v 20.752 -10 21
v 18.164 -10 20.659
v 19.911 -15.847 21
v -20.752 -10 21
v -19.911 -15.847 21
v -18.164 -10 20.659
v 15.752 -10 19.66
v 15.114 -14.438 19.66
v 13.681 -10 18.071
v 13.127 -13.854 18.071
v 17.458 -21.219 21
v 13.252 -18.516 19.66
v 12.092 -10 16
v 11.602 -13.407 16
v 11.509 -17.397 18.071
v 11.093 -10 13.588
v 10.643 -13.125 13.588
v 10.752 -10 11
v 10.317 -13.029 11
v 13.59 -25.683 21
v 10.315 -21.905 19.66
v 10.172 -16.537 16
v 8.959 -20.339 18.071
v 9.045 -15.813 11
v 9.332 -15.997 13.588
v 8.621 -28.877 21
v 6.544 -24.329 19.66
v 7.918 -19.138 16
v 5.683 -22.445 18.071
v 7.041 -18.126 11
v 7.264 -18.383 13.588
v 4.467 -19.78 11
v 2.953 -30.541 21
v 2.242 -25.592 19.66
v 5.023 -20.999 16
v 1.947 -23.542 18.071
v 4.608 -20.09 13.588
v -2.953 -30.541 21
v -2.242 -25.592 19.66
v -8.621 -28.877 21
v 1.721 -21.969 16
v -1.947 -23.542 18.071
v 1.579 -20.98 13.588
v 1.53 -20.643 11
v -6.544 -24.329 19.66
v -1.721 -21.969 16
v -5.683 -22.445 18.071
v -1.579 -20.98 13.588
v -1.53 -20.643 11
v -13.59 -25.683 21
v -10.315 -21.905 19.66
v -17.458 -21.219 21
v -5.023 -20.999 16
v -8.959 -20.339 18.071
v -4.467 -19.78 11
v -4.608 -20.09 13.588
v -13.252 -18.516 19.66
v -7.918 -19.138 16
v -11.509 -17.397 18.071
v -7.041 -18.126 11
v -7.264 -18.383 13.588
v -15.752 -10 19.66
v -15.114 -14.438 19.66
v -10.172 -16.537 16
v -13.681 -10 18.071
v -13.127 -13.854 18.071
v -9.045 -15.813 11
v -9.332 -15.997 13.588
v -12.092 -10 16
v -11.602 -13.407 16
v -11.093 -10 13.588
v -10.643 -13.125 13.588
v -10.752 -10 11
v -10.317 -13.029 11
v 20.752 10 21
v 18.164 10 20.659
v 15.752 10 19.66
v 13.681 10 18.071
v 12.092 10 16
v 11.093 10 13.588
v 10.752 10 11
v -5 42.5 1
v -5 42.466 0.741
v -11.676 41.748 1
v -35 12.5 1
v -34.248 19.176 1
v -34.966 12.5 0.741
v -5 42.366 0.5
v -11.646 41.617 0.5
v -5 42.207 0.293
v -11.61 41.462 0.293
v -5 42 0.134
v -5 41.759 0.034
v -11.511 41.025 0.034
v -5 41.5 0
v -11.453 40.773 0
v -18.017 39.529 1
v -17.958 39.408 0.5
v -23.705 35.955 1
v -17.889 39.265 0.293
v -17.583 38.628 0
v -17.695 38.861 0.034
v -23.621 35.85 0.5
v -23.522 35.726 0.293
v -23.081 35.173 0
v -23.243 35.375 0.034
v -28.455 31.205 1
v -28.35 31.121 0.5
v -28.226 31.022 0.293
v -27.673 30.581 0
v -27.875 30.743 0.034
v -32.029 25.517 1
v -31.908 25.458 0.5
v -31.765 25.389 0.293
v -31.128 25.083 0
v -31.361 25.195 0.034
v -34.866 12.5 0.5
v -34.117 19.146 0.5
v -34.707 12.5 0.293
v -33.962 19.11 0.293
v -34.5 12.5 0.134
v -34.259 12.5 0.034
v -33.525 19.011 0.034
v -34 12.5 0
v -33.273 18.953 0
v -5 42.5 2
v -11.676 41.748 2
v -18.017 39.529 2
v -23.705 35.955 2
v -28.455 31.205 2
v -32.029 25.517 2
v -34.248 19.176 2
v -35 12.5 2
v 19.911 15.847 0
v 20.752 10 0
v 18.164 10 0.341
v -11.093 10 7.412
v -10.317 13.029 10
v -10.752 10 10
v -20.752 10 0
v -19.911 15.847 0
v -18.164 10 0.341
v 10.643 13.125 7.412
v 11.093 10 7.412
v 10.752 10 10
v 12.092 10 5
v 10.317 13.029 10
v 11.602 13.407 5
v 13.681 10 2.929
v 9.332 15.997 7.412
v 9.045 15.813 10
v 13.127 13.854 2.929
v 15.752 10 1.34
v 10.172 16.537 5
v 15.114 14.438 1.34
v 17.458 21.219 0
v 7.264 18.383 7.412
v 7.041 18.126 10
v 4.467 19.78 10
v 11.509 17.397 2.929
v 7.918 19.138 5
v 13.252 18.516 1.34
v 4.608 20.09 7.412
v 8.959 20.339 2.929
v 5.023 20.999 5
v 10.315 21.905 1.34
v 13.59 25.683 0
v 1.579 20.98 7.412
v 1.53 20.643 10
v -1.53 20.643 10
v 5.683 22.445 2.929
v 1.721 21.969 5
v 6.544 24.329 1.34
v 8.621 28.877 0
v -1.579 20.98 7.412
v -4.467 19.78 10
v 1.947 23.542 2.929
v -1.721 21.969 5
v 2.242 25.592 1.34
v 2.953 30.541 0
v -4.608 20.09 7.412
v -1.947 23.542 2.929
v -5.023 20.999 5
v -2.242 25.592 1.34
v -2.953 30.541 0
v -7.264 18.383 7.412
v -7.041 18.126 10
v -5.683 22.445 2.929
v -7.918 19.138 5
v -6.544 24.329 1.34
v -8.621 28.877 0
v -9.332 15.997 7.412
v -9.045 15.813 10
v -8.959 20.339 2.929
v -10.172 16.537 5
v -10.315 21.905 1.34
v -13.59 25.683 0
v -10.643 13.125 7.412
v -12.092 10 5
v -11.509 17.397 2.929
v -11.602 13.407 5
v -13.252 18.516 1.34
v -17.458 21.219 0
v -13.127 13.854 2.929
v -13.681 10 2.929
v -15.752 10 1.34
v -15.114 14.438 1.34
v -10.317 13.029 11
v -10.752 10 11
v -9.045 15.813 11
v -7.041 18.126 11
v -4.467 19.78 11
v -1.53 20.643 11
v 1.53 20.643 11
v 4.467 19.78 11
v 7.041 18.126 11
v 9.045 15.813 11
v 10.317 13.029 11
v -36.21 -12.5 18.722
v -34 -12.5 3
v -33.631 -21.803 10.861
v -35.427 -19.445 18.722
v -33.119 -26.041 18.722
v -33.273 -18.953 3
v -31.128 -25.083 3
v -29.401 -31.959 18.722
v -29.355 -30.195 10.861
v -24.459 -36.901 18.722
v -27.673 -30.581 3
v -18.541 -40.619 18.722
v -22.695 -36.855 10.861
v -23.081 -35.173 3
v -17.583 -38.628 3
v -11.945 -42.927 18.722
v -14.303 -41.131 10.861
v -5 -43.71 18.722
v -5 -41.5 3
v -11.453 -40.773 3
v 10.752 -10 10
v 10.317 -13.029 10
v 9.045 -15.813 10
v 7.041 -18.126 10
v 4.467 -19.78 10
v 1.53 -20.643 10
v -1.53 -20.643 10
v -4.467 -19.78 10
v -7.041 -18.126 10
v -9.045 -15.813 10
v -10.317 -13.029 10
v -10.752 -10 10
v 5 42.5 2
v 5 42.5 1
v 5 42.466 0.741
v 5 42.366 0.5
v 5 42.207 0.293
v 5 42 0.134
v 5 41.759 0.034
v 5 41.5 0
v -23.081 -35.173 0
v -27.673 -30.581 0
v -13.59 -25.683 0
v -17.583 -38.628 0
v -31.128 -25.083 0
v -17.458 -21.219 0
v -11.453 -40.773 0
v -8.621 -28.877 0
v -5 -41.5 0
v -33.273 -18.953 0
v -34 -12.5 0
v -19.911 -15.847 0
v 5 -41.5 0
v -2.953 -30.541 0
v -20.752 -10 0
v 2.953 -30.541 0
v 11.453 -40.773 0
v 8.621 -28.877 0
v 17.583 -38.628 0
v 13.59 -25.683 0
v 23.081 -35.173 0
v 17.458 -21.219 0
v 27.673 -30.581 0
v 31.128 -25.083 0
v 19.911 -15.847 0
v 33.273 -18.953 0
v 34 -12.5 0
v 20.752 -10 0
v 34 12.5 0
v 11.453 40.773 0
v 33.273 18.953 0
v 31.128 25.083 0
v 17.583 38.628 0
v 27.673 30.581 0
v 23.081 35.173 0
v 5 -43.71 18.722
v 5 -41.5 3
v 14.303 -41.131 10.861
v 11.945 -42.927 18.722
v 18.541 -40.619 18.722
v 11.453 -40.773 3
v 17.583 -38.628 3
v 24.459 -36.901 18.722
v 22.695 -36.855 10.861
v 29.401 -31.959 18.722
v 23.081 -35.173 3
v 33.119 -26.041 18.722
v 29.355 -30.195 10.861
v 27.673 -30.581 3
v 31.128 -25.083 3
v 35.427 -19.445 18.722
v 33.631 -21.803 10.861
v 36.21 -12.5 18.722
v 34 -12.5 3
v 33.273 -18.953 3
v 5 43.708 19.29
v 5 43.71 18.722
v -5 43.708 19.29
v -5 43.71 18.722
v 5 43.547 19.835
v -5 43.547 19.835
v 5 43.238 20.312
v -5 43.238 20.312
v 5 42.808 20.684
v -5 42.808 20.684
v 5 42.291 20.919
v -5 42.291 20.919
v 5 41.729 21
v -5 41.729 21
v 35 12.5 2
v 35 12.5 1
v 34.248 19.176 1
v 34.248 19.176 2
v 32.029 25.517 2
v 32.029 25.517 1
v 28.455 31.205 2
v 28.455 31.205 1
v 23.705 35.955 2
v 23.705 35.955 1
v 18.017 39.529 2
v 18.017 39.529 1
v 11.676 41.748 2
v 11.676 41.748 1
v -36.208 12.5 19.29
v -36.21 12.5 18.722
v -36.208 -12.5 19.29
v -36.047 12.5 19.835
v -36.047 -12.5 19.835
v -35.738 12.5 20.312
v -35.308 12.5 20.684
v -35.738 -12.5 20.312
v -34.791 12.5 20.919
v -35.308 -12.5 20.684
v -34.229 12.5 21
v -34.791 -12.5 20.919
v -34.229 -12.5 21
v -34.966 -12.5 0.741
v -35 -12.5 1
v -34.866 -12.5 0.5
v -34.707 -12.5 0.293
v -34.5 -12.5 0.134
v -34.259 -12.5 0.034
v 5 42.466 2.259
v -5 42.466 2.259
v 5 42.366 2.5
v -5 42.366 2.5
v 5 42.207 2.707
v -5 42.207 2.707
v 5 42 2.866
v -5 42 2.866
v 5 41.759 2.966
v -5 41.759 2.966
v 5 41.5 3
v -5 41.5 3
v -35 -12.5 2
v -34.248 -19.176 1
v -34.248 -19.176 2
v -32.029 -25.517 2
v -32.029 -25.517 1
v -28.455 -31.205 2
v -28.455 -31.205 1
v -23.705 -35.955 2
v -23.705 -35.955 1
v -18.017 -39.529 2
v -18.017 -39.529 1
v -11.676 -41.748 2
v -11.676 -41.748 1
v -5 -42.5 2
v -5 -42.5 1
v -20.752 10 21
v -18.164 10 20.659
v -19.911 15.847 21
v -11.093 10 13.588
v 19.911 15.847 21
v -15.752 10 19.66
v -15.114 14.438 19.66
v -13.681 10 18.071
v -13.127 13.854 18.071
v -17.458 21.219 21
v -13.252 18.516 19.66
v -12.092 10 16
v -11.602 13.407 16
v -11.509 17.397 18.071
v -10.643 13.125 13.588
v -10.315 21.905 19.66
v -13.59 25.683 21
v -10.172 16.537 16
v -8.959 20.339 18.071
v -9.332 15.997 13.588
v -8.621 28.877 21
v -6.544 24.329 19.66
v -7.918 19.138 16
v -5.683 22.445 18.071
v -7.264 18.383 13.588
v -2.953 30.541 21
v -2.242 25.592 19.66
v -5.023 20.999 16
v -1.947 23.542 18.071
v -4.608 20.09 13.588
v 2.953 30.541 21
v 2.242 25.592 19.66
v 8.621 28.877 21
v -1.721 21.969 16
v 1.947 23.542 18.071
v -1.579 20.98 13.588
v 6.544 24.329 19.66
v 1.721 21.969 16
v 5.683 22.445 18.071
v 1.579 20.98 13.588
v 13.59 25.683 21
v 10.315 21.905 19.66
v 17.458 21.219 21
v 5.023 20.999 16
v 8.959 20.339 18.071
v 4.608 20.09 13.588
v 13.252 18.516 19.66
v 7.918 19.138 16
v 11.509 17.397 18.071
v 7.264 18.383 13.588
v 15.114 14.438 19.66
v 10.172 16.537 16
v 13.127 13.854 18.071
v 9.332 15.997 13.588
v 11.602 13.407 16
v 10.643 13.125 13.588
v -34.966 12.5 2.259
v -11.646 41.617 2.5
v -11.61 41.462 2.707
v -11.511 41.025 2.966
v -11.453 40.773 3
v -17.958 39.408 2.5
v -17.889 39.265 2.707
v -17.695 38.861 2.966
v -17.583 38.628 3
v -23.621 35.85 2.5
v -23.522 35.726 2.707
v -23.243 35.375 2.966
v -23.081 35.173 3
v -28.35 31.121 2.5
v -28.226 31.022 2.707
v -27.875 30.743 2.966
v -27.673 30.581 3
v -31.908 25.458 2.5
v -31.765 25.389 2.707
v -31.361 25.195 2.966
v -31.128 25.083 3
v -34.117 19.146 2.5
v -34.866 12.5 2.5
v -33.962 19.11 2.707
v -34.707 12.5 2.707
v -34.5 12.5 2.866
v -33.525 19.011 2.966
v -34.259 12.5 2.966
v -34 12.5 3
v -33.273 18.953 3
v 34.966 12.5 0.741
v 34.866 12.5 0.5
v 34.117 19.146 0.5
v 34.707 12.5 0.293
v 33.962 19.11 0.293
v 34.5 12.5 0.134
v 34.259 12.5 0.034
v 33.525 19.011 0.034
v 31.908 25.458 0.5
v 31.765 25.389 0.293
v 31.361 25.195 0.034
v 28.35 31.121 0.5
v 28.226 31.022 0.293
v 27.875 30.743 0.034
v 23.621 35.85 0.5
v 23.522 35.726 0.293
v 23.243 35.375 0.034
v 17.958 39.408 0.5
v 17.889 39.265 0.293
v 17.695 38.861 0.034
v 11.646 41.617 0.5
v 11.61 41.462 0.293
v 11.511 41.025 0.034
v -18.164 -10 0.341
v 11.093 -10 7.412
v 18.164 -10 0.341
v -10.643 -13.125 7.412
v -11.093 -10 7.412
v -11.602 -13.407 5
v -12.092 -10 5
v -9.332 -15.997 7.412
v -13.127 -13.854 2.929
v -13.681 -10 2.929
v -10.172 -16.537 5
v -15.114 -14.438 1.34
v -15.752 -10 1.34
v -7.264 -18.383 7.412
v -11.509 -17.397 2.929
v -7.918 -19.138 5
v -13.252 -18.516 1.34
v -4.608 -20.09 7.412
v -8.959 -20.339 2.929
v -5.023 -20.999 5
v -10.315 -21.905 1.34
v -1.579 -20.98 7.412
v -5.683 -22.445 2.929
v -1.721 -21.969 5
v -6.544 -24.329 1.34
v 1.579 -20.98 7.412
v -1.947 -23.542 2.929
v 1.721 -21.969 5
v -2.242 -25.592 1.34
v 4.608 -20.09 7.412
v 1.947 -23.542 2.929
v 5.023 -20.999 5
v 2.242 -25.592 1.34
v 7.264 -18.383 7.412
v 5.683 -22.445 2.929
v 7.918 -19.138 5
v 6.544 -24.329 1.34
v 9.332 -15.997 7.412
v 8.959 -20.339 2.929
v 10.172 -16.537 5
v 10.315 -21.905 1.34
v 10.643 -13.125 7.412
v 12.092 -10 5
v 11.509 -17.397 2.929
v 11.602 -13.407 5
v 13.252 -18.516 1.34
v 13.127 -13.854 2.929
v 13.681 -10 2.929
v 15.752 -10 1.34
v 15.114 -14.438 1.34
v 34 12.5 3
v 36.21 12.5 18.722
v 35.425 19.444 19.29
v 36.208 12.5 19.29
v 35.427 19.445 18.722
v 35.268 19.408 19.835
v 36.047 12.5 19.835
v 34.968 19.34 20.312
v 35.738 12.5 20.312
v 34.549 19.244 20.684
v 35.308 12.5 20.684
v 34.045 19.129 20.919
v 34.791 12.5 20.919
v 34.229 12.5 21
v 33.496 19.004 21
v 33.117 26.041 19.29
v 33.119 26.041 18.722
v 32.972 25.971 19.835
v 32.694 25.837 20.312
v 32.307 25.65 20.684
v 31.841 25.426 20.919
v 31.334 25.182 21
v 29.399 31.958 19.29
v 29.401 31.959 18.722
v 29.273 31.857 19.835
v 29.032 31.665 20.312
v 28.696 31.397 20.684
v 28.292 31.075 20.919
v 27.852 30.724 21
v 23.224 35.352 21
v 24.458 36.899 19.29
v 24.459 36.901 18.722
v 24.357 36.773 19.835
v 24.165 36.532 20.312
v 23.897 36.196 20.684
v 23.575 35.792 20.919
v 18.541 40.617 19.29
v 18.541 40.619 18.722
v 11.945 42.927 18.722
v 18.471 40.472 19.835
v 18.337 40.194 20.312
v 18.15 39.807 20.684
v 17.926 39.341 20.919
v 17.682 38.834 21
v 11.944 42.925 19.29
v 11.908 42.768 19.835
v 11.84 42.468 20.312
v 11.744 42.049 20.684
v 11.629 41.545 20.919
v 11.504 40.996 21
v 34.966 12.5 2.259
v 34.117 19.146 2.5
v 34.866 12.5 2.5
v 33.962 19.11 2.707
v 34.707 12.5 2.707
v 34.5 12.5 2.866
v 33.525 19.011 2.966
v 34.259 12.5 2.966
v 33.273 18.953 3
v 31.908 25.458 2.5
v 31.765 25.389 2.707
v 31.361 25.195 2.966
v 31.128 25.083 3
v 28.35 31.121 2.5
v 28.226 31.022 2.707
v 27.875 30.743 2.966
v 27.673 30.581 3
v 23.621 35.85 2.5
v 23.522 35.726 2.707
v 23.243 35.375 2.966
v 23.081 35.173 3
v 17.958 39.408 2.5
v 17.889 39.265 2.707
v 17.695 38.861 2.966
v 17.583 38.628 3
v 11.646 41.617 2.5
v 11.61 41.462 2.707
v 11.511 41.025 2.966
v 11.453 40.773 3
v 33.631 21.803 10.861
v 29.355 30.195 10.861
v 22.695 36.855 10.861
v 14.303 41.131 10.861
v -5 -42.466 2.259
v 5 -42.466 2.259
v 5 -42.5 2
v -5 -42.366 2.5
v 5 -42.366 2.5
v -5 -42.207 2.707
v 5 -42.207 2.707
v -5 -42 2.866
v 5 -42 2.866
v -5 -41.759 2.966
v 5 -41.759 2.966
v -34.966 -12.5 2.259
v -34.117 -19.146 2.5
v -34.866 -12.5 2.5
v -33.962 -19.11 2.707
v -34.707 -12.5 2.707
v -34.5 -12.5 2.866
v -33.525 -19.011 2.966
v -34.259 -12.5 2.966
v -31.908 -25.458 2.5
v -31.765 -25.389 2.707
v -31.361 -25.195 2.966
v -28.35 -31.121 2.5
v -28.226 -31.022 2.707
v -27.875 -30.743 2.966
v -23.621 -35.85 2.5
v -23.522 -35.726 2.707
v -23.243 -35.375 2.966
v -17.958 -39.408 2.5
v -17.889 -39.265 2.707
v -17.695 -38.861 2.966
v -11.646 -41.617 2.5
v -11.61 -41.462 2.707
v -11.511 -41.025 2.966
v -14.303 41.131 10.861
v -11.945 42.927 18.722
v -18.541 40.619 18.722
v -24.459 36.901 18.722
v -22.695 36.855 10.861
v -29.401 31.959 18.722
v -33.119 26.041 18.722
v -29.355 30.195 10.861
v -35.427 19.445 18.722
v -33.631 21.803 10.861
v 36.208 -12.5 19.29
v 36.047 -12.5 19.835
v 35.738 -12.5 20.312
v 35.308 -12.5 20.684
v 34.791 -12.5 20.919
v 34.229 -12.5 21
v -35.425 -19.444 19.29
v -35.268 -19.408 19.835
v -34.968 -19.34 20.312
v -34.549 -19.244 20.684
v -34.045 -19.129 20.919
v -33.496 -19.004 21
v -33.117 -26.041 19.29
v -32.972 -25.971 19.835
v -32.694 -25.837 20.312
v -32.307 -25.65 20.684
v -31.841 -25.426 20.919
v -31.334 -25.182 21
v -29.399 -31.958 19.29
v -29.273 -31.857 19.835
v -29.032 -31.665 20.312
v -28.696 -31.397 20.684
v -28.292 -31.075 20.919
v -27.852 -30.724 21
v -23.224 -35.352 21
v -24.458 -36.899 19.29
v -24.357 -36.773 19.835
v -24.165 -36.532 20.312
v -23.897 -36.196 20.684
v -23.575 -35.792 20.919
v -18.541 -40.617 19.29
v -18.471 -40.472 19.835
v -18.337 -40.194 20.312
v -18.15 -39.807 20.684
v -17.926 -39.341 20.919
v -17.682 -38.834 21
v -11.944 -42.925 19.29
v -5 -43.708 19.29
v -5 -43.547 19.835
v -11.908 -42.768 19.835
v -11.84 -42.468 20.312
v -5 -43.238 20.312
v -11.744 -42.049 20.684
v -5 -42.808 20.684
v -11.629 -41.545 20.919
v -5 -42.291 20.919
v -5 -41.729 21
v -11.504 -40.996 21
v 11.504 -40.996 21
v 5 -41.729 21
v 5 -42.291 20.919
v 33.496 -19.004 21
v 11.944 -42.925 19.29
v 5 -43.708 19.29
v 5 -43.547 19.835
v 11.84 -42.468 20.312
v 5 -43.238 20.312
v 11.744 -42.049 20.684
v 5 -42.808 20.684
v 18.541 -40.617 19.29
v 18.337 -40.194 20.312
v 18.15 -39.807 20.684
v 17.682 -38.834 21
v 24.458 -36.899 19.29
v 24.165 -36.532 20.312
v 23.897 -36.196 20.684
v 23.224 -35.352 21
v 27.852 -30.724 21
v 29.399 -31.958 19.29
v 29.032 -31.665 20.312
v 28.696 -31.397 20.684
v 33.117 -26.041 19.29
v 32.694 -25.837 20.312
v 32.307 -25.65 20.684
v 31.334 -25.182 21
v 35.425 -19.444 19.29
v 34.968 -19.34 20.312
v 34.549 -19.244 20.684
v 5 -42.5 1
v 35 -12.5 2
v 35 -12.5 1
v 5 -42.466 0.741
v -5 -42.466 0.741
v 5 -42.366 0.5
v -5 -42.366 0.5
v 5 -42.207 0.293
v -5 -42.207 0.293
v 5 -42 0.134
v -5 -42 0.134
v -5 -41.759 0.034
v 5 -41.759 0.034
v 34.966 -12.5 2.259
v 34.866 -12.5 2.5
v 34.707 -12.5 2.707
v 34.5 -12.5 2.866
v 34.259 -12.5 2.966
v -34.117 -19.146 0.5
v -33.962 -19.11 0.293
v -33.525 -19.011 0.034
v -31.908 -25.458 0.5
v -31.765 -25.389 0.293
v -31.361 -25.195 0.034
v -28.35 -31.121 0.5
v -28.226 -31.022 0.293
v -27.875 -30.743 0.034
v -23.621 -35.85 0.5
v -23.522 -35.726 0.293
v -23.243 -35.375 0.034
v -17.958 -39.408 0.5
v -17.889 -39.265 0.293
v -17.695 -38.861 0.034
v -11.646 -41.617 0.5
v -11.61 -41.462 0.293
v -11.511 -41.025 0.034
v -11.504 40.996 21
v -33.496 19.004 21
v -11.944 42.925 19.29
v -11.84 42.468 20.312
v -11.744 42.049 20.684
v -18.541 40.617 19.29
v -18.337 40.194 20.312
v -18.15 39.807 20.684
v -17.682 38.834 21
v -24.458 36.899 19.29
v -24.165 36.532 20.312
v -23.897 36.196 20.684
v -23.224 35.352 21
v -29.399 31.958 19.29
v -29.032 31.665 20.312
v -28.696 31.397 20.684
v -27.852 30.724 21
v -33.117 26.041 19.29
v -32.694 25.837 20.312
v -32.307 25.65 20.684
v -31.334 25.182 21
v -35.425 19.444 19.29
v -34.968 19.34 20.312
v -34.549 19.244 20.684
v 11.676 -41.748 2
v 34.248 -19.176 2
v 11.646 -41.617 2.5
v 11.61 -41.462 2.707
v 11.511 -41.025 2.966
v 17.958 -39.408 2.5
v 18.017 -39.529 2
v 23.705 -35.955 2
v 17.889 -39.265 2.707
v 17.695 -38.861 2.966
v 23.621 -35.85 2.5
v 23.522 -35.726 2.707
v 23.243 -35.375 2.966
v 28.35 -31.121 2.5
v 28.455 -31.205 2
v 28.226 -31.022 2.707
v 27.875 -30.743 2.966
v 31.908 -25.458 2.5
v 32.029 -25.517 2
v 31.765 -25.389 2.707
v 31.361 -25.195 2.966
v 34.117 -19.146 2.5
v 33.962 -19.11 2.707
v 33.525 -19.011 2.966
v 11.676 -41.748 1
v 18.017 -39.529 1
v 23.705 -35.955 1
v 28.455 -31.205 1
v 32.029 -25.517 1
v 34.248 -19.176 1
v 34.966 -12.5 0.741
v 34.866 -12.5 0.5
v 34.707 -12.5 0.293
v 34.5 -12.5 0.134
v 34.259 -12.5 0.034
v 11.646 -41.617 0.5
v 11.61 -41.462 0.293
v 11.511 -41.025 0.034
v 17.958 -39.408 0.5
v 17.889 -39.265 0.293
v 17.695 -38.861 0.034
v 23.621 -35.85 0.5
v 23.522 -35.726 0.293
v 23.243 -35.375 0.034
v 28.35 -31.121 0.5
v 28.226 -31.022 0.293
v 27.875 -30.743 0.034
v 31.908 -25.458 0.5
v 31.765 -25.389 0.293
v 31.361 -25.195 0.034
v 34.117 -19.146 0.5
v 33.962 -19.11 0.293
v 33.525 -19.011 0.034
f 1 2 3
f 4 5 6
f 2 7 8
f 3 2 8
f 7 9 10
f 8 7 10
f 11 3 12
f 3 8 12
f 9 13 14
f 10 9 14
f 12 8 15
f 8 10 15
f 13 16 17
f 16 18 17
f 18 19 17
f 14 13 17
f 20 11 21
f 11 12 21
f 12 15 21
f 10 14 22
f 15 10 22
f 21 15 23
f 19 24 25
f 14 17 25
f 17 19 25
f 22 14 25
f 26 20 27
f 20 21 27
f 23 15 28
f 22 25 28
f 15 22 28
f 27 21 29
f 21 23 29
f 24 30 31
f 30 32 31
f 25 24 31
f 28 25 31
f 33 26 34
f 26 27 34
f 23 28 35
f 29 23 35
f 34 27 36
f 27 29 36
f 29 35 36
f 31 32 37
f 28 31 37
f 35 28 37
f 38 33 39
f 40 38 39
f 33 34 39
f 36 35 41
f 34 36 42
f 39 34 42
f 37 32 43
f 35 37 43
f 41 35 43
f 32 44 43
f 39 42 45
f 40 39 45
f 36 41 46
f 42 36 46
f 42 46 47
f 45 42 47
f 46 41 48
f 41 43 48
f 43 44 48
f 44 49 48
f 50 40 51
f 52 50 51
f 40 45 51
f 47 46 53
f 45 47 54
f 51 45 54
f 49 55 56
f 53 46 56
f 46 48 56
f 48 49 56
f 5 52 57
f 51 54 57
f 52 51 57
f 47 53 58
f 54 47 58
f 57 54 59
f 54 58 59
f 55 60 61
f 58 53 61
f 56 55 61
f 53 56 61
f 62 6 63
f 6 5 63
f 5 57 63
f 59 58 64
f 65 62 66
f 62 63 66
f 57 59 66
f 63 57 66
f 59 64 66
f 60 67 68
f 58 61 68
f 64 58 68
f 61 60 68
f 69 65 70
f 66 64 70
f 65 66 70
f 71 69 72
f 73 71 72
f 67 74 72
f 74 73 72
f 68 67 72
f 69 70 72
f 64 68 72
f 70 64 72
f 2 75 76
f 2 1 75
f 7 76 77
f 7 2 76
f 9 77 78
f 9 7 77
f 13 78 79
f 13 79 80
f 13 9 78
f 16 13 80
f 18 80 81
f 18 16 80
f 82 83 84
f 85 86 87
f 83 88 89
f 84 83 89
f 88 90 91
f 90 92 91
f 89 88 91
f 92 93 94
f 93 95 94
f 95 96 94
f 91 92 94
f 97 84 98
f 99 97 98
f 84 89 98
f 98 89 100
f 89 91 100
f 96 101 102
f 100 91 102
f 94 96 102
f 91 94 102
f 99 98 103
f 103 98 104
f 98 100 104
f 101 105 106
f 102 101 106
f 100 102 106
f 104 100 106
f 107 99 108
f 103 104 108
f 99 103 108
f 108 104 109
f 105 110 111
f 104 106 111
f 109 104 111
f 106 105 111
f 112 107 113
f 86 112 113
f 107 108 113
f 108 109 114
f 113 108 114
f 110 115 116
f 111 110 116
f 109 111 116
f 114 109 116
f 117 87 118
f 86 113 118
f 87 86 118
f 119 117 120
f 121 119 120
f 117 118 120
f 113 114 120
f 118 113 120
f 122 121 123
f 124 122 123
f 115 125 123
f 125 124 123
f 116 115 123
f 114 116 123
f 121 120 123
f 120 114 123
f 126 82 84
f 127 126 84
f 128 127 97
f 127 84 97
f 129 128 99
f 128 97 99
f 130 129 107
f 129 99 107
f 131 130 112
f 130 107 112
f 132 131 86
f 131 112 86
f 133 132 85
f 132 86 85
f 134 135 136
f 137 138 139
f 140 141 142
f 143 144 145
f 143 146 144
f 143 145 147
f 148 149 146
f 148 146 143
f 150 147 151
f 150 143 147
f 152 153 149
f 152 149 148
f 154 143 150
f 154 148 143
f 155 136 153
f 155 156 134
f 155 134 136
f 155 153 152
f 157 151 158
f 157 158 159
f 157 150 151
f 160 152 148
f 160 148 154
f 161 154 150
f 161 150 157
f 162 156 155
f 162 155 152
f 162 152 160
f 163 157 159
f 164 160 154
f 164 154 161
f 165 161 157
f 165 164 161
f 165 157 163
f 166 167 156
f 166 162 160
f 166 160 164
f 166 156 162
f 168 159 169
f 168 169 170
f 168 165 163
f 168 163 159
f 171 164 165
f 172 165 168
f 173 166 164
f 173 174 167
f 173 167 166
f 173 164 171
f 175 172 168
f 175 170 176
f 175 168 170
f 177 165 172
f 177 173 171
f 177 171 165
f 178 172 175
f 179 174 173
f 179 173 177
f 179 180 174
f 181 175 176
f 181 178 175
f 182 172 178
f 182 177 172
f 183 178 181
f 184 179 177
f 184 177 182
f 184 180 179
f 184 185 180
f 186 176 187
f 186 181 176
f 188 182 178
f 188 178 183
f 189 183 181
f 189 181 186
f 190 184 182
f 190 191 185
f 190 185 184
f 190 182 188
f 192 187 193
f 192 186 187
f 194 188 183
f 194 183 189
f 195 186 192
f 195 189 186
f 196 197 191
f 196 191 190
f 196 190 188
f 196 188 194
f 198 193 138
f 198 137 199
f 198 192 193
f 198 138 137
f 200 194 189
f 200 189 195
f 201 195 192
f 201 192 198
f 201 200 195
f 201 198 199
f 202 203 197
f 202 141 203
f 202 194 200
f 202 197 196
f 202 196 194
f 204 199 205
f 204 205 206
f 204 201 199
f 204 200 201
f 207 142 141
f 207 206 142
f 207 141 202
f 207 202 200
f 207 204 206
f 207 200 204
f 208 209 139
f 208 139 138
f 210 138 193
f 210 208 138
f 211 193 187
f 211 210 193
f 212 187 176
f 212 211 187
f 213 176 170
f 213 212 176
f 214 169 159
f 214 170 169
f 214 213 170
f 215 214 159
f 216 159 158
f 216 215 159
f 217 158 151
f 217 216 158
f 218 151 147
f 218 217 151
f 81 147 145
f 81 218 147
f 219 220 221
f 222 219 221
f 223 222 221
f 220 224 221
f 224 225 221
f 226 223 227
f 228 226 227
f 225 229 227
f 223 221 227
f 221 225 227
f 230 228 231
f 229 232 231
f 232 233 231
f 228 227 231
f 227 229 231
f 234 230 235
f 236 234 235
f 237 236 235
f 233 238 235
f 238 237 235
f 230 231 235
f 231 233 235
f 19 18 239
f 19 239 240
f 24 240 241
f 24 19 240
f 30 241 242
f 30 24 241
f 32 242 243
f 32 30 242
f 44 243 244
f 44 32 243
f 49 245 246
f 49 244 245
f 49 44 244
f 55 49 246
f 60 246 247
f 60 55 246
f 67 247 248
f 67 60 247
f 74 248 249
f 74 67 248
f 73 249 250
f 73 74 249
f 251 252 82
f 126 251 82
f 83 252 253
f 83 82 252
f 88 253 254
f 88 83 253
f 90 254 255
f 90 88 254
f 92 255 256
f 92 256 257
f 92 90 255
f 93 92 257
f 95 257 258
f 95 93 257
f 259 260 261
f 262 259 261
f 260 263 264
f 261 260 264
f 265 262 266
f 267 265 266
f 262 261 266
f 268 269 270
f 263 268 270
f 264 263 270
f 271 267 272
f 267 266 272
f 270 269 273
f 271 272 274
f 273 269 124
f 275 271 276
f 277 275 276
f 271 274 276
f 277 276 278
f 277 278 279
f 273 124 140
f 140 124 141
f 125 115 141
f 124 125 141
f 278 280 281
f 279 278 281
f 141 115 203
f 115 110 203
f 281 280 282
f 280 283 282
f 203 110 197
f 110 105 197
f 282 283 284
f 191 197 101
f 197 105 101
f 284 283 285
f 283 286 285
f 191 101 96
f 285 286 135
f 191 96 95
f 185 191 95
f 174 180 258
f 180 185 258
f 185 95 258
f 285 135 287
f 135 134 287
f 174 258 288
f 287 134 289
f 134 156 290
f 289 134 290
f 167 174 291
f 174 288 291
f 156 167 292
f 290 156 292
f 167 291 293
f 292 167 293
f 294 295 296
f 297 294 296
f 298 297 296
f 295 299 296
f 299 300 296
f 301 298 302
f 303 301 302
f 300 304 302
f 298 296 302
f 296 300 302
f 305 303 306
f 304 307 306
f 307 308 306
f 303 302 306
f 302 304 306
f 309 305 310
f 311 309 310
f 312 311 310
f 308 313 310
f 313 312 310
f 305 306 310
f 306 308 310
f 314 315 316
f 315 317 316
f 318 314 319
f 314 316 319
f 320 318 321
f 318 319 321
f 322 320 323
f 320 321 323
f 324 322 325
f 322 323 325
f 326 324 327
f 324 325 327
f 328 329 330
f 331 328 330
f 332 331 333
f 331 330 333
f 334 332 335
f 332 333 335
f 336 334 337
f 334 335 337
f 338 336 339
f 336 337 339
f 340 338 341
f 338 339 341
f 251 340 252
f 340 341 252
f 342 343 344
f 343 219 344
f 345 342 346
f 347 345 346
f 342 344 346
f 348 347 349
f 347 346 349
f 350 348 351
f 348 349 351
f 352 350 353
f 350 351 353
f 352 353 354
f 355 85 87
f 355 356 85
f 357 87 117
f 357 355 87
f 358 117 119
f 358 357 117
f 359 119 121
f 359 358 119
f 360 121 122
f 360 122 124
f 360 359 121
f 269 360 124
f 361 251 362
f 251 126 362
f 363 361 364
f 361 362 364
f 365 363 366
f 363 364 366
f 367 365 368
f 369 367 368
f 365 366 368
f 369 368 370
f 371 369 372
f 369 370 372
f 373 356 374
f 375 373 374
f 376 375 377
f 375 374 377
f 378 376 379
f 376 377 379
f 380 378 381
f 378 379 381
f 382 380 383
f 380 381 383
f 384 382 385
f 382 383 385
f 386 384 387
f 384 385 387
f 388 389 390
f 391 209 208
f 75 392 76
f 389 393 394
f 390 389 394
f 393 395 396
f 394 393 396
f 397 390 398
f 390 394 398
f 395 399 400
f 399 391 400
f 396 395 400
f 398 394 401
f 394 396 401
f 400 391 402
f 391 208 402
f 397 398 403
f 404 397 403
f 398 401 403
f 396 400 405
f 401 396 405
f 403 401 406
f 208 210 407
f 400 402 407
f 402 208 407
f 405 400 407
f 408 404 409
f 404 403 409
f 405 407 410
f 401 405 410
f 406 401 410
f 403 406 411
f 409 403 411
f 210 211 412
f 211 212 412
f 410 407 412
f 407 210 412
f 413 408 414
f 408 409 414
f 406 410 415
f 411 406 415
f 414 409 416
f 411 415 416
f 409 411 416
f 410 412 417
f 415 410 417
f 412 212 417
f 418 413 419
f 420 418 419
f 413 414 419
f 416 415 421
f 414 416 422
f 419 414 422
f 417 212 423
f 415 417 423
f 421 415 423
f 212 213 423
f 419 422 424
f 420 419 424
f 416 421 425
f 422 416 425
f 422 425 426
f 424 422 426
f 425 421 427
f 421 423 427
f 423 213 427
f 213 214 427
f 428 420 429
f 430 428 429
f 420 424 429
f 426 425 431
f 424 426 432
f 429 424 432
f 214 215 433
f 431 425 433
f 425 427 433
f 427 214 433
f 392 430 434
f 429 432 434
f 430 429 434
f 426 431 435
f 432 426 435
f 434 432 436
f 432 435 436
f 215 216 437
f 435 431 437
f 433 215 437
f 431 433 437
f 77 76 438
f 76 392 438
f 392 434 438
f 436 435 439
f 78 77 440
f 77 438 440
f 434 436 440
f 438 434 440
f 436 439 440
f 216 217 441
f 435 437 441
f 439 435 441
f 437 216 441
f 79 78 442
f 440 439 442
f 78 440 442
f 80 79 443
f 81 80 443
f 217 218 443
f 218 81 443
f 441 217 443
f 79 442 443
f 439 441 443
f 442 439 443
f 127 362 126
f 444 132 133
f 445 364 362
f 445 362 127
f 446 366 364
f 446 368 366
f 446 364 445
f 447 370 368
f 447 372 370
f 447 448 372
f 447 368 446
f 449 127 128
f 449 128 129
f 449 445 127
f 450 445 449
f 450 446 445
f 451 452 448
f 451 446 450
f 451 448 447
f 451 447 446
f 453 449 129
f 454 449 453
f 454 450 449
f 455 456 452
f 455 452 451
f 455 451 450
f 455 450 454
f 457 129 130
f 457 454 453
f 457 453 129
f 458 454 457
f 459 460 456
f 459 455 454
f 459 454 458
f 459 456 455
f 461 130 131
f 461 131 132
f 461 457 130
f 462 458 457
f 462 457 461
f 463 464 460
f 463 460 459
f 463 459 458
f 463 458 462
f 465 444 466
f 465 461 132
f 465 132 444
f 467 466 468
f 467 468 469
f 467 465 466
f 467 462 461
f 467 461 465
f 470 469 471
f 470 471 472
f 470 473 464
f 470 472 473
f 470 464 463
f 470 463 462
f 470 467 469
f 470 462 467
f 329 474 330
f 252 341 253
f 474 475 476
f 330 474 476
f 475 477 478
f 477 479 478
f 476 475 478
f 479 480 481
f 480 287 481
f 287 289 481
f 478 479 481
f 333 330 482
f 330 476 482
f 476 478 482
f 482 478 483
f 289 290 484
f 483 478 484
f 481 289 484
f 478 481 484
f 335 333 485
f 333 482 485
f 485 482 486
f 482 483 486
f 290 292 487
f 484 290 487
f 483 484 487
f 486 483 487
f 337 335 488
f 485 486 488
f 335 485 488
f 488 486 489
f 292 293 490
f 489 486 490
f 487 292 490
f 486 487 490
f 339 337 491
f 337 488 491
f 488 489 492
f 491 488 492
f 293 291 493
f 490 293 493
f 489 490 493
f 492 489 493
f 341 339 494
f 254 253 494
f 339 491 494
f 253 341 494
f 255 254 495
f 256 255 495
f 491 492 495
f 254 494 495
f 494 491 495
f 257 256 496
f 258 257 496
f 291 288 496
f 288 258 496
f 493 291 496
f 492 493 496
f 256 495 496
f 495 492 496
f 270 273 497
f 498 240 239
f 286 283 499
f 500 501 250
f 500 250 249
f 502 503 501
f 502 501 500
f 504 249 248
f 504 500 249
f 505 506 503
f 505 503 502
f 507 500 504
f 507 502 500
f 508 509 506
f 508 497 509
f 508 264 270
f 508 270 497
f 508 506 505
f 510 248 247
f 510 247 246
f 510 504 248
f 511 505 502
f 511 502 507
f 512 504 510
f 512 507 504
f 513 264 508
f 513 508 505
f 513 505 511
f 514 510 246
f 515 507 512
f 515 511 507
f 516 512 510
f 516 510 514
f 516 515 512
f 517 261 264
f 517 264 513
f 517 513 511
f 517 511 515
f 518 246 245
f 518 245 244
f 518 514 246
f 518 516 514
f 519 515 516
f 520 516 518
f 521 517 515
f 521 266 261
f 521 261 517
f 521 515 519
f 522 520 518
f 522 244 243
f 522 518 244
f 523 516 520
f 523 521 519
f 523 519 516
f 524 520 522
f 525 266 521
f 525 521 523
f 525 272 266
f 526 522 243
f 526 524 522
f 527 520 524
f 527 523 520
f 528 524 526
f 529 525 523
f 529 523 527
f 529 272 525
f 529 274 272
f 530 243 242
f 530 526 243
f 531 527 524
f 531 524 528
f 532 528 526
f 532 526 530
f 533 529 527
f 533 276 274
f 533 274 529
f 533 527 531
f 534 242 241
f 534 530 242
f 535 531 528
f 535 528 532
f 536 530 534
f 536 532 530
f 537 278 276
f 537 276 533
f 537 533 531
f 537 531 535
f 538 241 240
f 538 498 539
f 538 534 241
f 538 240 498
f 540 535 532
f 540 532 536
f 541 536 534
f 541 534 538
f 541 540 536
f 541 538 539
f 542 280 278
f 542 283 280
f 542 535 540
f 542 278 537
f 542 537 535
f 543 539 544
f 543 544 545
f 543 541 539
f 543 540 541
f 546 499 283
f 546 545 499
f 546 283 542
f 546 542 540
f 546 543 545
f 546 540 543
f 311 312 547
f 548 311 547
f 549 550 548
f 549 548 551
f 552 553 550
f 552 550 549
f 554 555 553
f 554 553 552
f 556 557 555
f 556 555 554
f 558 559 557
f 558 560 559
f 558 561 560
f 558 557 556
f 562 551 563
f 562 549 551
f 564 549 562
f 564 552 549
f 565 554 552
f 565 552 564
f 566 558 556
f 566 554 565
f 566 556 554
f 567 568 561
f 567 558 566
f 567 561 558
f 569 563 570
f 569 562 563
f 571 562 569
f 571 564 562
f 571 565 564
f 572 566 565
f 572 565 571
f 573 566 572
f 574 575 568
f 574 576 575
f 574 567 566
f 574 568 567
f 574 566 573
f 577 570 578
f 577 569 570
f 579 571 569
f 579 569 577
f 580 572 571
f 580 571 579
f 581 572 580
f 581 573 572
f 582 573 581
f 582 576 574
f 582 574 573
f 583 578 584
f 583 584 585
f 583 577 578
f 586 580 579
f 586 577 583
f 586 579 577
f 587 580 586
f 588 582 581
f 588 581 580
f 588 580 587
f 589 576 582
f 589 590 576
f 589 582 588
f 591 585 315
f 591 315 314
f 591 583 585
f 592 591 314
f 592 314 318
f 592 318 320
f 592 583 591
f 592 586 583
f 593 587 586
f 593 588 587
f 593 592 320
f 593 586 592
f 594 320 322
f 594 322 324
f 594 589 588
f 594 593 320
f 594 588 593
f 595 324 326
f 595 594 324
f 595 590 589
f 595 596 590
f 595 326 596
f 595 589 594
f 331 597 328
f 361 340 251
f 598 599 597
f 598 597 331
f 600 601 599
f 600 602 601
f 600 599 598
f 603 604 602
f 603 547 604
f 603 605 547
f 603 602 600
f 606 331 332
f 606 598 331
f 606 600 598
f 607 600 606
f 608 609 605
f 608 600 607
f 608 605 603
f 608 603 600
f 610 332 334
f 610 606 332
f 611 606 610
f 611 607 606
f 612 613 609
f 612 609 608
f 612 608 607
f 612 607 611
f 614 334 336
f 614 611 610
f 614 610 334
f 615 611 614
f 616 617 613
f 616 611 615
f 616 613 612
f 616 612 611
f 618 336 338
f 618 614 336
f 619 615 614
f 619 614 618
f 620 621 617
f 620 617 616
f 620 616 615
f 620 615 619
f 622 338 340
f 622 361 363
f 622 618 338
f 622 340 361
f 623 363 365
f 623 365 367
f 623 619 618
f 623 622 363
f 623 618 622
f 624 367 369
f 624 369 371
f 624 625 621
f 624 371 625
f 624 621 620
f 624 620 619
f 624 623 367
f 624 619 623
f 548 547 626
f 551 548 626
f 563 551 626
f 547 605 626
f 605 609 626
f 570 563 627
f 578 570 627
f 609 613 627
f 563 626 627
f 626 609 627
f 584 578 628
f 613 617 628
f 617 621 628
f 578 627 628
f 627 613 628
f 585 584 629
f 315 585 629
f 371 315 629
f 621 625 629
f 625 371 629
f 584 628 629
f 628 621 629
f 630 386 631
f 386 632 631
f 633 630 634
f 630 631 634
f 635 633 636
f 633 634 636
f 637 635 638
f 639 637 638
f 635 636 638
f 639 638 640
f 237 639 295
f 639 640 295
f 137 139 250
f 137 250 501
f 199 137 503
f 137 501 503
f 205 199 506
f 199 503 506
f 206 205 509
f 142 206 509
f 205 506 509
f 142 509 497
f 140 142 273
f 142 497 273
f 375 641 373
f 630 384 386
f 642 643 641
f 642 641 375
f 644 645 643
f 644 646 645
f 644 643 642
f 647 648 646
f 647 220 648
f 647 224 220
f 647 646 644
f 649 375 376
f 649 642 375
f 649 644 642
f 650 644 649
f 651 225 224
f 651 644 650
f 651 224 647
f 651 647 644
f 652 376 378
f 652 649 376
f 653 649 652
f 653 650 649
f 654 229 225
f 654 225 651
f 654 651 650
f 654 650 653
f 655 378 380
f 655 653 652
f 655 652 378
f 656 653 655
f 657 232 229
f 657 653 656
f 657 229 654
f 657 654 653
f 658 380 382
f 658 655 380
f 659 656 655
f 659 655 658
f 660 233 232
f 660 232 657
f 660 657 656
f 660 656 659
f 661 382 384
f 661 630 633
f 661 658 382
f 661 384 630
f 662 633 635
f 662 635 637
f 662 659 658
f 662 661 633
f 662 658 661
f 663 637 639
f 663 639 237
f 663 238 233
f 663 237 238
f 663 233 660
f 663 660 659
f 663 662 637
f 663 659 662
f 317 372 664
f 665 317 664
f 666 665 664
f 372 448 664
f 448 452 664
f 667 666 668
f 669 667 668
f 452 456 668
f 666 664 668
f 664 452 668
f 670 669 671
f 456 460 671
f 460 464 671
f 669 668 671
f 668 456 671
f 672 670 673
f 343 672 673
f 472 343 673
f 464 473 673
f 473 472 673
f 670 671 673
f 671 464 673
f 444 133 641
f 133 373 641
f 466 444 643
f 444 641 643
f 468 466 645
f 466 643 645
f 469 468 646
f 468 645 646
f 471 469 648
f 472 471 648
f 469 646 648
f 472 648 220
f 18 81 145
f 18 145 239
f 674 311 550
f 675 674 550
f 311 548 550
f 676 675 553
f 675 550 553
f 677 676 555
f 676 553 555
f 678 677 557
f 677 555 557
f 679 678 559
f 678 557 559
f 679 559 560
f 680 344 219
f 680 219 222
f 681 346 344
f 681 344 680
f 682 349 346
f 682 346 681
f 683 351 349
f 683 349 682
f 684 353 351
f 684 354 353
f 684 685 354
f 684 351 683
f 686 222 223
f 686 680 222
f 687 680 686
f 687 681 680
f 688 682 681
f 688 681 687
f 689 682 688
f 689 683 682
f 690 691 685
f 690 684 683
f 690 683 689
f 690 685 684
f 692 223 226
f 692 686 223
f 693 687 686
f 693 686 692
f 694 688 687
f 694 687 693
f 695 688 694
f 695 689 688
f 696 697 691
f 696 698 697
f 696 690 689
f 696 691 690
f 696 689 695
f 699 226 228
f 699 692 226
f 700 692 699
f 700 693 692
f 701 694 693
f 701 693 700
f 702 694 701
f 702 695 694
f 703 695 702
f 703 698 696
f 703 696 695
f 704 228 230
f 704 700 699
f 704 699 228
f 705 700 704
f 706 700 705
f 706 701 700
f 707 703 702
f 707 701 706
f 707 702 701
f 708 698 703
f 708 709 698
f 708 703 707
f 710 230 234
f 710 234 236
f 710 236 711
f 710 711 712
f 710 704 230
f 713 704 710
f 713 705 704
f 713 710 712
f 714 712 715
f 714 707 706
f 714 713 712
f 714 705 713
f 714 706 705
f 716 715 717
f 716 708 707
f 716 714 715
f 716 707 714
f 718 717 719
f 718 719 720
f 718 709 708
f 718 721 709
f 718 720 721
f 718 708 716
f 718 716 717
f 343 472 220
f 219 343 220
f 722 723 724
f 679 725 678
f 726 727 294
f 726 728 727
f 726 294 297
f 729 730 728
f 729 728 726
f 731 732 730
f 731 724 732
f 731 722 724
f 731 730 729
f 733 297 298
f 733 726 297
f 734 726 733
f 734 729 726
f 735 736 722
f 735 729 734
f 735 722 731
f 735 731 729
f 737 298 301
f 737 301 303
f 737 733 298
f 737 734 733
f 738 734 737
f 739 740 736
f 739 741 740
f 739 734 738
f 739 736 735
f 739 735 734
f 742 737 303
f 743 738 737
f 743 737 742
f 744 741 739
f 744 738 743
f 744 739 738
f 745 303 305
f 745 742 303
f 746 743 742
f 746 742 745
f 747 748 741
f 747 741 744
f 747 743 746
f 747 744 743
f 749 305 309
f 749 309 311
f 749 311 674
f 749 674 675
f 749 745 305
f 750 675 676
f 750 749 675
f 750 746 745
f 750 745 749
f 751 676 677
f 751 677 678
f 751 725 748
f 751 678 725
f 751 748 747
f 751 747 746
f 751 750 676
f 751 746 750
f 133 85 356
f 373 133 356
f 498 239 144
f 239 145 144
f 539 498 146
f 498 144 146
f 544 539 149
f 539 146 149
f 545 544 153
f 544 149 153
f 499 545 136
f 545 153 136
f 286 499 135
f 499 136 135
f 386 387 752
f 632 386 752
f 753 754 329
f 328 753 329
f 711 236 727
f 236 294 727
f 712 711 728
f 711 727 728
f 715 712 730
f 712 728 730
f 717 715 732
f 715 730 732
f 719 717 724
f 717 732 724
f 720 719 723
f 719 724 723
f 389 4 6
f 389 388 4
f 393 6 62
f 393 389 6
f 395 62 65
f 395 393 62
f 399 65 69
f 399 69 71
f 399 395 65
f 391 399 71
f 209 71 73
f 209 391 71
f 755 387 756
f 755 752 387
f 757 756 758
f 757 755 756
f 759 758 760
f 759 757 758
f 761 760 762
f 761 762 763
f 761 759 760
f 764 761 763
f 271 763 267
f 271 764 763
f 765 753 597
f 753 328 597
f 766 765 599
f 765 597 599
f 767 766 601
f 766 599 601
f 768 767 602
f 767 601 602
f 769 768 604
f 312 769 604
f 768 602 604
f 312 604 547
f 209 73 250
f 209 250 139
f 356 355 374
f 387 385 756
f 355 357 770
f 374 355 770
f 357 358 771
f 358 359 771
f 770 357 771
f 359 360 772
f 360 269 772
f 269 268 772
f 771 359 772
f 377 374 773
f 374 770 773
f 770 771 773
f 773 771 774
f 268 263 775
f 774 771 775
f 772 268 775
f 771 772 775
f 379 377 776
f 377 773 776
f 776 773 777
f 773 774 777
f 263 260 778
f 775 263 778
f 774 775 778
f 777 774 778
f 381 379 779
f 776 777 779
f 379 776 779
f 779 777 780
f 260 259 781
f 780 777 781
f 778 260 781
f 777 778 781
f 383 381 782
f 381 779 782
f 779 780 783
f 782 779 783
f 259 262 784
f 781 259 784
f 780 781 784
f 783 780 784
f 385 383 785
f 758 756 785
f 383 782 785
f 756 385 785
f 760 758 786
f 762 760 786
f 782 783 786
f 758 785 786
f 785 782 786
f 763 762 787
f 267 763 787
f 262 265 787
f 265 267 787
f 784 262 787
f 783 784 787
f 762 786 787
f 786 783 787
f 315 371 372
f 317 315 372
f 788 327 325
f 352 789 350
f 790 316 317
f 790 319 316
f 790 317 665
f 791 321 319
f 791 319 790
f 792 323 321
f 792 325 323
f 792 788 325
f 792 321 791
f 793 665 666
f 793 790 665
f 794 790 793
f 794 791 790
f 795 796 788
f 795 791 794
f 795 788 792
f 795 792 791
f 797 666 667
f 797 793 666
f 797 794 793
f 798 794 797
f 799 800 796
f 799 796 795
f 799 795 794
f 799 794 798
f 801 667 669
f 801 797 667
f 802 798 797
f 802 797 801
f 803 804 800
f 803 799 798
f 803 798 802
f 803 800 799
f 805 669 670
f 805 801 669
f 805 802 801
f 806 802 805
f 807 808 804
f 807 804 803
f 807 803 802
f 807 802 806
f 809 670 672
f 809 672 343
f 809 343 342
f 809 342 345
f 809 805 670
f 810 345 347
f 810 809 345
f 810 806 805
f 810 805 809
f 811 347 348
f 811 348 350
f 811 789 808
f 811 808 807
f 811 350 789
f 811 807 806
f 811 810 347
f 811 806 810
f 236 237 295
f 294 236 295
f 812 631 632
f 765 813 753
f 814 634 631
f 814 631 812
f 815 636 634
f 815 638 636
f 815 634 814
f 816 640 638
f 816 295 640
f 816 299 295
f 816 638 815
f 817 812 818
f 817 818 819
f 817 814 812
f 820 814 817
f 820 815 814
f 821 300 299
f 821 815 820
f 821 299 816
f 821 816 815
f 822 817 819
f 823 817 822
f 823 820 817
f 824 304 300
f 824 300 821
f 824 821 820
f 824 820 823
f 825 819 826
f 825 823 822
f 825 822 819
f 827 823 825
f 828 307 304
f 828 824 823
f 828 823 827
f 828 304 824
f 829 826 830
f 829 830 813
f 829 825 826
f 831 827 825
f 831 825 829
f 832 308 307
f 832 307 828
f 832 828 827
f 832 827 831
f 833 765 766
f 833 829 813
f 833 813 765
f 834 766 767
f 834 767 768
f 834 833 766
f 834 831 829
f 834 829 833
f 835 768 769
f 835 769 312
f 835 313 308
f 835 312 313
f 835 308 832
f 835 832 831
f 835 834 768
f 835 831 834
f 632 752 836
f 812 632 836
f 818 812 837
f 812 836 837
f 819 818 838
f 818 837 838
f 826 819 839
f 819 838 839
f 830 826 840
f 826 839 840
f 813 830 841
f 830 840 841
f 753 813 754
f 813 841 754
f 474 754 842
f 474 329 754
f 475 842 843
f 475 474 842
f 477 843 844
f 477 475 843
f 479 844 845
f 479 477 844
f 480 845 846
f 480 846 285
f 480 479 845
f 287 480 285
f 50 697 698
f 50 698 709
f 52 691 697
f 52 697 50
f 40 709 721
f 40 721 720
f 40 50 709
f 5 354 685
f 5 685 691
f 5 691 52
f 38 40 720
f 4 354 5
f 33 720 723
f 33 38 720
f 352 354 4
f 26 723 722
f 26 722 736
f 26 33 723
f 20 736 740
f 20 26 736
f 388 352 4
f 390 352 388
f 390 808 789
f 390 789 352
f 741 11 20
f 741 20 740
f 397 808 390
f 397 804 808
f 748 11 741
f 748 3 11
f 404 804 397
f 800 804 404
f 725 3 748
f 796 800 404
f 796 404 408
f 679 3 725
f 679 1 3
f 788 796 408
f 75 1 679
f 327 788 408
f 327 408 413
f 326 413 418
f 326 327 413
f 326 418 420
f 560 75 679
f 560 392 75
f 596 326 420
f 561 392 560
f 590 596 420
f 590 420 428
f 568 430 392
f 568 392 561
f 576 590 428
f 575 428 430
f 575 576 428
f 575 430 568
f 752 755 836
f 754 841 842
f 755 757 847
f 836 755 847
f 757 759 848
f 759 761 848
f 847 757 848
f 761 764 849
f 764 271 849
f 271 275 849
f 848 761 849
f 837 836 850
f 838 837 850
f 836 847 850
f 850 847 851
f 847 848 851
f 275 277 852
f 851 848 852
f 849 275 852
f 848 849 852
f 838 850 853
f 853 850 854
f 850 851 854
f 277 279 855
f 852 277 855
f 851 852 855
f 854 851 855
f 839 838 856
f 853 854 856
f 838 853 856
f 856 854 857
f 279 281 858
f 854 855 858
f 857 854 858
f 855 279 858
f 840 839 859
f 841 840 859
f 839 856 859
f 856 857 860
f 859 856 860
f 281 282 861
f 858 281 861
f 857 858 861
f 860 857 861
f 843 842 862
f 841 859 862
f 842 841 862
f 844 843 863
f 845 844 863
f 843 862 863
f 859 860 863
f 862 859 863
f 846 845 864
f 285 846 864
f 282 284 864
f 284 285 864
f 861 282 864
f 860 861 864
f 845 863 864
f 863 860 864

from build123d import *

# Parameters (mm, degrees)
BOSS_EXTRUDE1_DEPTH = 3
FILLET1_R           = 1
BOSS_EXTRUDE2_DEPTH = 18
BOSS_EXTRUDE2_DRAFT = -8
FILLET2_R           = 2
CUT_EXTRUDE1_DEPTH  = 61.545566409
FILLET4_R           = 10


with BuildPart() as part:
    # Sketch2 → Boss-Extrude1 (new body)
    with BuildSketch(Plane.XY):
        with BuildLine():
            Line((-5, -42.5), (5, -42.5))
            ThreePointArc((5, -42.5), (26.213203436, -33.713203436), (35, -12.5))
            Line((35, -12.5), (35, 12.5))
            ThreePointArc((35, 12.5), (26.213203436, 33.713203436), (5, 42.5))
            Line((5, 42.5), (-5, 42.5))
            ThreePointArc((-5, 42.5), (-26.213203436, 33.713203436), (-35, 12.5))
            Line((-35, 12.5), (-35, -12.5))
            ThreePointArc((-35, -12.5), (-26.213203436, -33.713203436), (-5, -42.5))
        make_face()
    extrude(amount=BOSS_EXTRUDE1_DEPTH)

    # Fillet1
    fillet1_edges = [part.edges().sort_by_distance(p)[0] for p in [
        (0, -42.5, 0),
        (-26.213203436, -33.713203436, 0),
        (-35, 0, 0),
        (-26.213203436, 33.713203436, 0),
        (-26.213203436, -33.713203436, 3),
        (0, -42.5, 3),
        (26.213203436, -33.713203436, 3),
        (35, 0, 3),
        (26.213203436, 33.713203436, 3),
        (0, 42.5, 3),
        (-26.213203436, 33.713203436, 3),
        (0, 42.5, 0),
        (-35, 0, 3),
        (26.213203436, 33.713203436, 0),
        (35, 0, 0),
        (26.213203436, -33.713203436, 0),
    ]]
    fillet(fillet1_edges, radius=FILLET1_R)


with BuildPart() as boss_extrude2_tool:
    # Sketch3 → Boss-Extrude2 (with draft: the straight prism first)
    with BuildSketch(Plane.XY.offset(3)):
        with BuildLine():
            Line((5, 41.5), (-5, 41.5))
            ThreePointArc((-5, 41.5), (-25.506096654, 33.006096654), (-34, 12.5))
            Line((-34, 12.5), (-34, -12.5))
            ThreePointArc((-34, -12.5), (-25.506096654, -33.006096654), (-5, -41.5))
            Line((-5, -41.5), (5, -41.5))
            ThreePointArc((5, -41.5), (25.506096654, -33.006096654), (34, -12.5))
            Line((34, -12.5), (34, 12.5))
            ThreePointArc((34, 12.5), (25.506096654, 33.006096654), (5, 41.5))
        make_face()
    extrude(amount=BOSS_EXTRUDE2_DEPTH)
    # Boss-Extrude2: the draft: its side faces are tilted about the plane it starts from
    boss_extrude2_sides = [boss_extrude2_tool.faces().sort_by_distance(p)[0] for p in [
        (-25.506096654, -33.006096654, 12),
        (0, -41.5, 12),
        (25.506096654, -33.006096654, 12),
        (34, 0, 12),
        (25.506096654, 33.006096654, 12),
        (0, 41.5, 12),
        (-25.506096654, 33.006096654, 12),
        (-34, 0, 12),
    ]]
    draft(boss_extrude2_sides, Plane.XY.offset(3), BOSS_EXTRUDE2_DRAFT)


with BuildPart() as part_1:
    add(part.part)

    # Boss-Extrude2: add boss_extrude2_tool
    add(boss_extrude2_tool.part)

    # Fillet2
    fillet2_edges = [part_1.edges().sort_by_distance(p)[0] for p in [
        (27.294889445, 34.794889445, 21),
        (0, 44.029735025, 21),
        (-27.294889445, 34.794889445, 21),
        (-36.529735025, 0, 21),
        (-27.294889445, -34.794889445, 21),
        (0, -44.029735025, 21),
        (27.294889445, -34.794889445, 21),
        (36.529735025, 0, 21),
    ]]
    fillet(fillet2_edges, radius=FILLET2_R)

    # Sketch5 → Cut-Extrude1 (cut, through all)
    with BuildSketch(Plane.XY.offset(21)):
        with BuildLine():
            Line((-10.75208941, -10), (-10.75208941, 10))
            ThreePointArc((-10.75208941, 10), (0, 20.75208941), (10.75208941, 10))
            Line((10.75208941, 10), (10.75208941, -10))
            ThreePointArc((10.75208941, -10), (0, -20.75208941), (-10.75208941, -10))
        make_face()
    extrude(amount=-CUT_EXTRUDE1_DEPTH, mode=Mode.SUBTRACT)

    # Fillet4
    fillet4_edges = [part_1.edges().sort_by_distance(p)[0] for p in [
        (0, -20.75208941, 0),
        (-10.75208941, 0, 0),
        (0, 20.75208941, 0),
        (10.75208941, 0, 0),
        (0, -20.75208941, 21),
        (10.75208941, 0, 21),
        (0, 20.75208941, 21),
        (-10.75208941, 0, 21),
    ]]
    fillet(fillet4_edges, radius=FILLET4_R)


solid = part_1.part
